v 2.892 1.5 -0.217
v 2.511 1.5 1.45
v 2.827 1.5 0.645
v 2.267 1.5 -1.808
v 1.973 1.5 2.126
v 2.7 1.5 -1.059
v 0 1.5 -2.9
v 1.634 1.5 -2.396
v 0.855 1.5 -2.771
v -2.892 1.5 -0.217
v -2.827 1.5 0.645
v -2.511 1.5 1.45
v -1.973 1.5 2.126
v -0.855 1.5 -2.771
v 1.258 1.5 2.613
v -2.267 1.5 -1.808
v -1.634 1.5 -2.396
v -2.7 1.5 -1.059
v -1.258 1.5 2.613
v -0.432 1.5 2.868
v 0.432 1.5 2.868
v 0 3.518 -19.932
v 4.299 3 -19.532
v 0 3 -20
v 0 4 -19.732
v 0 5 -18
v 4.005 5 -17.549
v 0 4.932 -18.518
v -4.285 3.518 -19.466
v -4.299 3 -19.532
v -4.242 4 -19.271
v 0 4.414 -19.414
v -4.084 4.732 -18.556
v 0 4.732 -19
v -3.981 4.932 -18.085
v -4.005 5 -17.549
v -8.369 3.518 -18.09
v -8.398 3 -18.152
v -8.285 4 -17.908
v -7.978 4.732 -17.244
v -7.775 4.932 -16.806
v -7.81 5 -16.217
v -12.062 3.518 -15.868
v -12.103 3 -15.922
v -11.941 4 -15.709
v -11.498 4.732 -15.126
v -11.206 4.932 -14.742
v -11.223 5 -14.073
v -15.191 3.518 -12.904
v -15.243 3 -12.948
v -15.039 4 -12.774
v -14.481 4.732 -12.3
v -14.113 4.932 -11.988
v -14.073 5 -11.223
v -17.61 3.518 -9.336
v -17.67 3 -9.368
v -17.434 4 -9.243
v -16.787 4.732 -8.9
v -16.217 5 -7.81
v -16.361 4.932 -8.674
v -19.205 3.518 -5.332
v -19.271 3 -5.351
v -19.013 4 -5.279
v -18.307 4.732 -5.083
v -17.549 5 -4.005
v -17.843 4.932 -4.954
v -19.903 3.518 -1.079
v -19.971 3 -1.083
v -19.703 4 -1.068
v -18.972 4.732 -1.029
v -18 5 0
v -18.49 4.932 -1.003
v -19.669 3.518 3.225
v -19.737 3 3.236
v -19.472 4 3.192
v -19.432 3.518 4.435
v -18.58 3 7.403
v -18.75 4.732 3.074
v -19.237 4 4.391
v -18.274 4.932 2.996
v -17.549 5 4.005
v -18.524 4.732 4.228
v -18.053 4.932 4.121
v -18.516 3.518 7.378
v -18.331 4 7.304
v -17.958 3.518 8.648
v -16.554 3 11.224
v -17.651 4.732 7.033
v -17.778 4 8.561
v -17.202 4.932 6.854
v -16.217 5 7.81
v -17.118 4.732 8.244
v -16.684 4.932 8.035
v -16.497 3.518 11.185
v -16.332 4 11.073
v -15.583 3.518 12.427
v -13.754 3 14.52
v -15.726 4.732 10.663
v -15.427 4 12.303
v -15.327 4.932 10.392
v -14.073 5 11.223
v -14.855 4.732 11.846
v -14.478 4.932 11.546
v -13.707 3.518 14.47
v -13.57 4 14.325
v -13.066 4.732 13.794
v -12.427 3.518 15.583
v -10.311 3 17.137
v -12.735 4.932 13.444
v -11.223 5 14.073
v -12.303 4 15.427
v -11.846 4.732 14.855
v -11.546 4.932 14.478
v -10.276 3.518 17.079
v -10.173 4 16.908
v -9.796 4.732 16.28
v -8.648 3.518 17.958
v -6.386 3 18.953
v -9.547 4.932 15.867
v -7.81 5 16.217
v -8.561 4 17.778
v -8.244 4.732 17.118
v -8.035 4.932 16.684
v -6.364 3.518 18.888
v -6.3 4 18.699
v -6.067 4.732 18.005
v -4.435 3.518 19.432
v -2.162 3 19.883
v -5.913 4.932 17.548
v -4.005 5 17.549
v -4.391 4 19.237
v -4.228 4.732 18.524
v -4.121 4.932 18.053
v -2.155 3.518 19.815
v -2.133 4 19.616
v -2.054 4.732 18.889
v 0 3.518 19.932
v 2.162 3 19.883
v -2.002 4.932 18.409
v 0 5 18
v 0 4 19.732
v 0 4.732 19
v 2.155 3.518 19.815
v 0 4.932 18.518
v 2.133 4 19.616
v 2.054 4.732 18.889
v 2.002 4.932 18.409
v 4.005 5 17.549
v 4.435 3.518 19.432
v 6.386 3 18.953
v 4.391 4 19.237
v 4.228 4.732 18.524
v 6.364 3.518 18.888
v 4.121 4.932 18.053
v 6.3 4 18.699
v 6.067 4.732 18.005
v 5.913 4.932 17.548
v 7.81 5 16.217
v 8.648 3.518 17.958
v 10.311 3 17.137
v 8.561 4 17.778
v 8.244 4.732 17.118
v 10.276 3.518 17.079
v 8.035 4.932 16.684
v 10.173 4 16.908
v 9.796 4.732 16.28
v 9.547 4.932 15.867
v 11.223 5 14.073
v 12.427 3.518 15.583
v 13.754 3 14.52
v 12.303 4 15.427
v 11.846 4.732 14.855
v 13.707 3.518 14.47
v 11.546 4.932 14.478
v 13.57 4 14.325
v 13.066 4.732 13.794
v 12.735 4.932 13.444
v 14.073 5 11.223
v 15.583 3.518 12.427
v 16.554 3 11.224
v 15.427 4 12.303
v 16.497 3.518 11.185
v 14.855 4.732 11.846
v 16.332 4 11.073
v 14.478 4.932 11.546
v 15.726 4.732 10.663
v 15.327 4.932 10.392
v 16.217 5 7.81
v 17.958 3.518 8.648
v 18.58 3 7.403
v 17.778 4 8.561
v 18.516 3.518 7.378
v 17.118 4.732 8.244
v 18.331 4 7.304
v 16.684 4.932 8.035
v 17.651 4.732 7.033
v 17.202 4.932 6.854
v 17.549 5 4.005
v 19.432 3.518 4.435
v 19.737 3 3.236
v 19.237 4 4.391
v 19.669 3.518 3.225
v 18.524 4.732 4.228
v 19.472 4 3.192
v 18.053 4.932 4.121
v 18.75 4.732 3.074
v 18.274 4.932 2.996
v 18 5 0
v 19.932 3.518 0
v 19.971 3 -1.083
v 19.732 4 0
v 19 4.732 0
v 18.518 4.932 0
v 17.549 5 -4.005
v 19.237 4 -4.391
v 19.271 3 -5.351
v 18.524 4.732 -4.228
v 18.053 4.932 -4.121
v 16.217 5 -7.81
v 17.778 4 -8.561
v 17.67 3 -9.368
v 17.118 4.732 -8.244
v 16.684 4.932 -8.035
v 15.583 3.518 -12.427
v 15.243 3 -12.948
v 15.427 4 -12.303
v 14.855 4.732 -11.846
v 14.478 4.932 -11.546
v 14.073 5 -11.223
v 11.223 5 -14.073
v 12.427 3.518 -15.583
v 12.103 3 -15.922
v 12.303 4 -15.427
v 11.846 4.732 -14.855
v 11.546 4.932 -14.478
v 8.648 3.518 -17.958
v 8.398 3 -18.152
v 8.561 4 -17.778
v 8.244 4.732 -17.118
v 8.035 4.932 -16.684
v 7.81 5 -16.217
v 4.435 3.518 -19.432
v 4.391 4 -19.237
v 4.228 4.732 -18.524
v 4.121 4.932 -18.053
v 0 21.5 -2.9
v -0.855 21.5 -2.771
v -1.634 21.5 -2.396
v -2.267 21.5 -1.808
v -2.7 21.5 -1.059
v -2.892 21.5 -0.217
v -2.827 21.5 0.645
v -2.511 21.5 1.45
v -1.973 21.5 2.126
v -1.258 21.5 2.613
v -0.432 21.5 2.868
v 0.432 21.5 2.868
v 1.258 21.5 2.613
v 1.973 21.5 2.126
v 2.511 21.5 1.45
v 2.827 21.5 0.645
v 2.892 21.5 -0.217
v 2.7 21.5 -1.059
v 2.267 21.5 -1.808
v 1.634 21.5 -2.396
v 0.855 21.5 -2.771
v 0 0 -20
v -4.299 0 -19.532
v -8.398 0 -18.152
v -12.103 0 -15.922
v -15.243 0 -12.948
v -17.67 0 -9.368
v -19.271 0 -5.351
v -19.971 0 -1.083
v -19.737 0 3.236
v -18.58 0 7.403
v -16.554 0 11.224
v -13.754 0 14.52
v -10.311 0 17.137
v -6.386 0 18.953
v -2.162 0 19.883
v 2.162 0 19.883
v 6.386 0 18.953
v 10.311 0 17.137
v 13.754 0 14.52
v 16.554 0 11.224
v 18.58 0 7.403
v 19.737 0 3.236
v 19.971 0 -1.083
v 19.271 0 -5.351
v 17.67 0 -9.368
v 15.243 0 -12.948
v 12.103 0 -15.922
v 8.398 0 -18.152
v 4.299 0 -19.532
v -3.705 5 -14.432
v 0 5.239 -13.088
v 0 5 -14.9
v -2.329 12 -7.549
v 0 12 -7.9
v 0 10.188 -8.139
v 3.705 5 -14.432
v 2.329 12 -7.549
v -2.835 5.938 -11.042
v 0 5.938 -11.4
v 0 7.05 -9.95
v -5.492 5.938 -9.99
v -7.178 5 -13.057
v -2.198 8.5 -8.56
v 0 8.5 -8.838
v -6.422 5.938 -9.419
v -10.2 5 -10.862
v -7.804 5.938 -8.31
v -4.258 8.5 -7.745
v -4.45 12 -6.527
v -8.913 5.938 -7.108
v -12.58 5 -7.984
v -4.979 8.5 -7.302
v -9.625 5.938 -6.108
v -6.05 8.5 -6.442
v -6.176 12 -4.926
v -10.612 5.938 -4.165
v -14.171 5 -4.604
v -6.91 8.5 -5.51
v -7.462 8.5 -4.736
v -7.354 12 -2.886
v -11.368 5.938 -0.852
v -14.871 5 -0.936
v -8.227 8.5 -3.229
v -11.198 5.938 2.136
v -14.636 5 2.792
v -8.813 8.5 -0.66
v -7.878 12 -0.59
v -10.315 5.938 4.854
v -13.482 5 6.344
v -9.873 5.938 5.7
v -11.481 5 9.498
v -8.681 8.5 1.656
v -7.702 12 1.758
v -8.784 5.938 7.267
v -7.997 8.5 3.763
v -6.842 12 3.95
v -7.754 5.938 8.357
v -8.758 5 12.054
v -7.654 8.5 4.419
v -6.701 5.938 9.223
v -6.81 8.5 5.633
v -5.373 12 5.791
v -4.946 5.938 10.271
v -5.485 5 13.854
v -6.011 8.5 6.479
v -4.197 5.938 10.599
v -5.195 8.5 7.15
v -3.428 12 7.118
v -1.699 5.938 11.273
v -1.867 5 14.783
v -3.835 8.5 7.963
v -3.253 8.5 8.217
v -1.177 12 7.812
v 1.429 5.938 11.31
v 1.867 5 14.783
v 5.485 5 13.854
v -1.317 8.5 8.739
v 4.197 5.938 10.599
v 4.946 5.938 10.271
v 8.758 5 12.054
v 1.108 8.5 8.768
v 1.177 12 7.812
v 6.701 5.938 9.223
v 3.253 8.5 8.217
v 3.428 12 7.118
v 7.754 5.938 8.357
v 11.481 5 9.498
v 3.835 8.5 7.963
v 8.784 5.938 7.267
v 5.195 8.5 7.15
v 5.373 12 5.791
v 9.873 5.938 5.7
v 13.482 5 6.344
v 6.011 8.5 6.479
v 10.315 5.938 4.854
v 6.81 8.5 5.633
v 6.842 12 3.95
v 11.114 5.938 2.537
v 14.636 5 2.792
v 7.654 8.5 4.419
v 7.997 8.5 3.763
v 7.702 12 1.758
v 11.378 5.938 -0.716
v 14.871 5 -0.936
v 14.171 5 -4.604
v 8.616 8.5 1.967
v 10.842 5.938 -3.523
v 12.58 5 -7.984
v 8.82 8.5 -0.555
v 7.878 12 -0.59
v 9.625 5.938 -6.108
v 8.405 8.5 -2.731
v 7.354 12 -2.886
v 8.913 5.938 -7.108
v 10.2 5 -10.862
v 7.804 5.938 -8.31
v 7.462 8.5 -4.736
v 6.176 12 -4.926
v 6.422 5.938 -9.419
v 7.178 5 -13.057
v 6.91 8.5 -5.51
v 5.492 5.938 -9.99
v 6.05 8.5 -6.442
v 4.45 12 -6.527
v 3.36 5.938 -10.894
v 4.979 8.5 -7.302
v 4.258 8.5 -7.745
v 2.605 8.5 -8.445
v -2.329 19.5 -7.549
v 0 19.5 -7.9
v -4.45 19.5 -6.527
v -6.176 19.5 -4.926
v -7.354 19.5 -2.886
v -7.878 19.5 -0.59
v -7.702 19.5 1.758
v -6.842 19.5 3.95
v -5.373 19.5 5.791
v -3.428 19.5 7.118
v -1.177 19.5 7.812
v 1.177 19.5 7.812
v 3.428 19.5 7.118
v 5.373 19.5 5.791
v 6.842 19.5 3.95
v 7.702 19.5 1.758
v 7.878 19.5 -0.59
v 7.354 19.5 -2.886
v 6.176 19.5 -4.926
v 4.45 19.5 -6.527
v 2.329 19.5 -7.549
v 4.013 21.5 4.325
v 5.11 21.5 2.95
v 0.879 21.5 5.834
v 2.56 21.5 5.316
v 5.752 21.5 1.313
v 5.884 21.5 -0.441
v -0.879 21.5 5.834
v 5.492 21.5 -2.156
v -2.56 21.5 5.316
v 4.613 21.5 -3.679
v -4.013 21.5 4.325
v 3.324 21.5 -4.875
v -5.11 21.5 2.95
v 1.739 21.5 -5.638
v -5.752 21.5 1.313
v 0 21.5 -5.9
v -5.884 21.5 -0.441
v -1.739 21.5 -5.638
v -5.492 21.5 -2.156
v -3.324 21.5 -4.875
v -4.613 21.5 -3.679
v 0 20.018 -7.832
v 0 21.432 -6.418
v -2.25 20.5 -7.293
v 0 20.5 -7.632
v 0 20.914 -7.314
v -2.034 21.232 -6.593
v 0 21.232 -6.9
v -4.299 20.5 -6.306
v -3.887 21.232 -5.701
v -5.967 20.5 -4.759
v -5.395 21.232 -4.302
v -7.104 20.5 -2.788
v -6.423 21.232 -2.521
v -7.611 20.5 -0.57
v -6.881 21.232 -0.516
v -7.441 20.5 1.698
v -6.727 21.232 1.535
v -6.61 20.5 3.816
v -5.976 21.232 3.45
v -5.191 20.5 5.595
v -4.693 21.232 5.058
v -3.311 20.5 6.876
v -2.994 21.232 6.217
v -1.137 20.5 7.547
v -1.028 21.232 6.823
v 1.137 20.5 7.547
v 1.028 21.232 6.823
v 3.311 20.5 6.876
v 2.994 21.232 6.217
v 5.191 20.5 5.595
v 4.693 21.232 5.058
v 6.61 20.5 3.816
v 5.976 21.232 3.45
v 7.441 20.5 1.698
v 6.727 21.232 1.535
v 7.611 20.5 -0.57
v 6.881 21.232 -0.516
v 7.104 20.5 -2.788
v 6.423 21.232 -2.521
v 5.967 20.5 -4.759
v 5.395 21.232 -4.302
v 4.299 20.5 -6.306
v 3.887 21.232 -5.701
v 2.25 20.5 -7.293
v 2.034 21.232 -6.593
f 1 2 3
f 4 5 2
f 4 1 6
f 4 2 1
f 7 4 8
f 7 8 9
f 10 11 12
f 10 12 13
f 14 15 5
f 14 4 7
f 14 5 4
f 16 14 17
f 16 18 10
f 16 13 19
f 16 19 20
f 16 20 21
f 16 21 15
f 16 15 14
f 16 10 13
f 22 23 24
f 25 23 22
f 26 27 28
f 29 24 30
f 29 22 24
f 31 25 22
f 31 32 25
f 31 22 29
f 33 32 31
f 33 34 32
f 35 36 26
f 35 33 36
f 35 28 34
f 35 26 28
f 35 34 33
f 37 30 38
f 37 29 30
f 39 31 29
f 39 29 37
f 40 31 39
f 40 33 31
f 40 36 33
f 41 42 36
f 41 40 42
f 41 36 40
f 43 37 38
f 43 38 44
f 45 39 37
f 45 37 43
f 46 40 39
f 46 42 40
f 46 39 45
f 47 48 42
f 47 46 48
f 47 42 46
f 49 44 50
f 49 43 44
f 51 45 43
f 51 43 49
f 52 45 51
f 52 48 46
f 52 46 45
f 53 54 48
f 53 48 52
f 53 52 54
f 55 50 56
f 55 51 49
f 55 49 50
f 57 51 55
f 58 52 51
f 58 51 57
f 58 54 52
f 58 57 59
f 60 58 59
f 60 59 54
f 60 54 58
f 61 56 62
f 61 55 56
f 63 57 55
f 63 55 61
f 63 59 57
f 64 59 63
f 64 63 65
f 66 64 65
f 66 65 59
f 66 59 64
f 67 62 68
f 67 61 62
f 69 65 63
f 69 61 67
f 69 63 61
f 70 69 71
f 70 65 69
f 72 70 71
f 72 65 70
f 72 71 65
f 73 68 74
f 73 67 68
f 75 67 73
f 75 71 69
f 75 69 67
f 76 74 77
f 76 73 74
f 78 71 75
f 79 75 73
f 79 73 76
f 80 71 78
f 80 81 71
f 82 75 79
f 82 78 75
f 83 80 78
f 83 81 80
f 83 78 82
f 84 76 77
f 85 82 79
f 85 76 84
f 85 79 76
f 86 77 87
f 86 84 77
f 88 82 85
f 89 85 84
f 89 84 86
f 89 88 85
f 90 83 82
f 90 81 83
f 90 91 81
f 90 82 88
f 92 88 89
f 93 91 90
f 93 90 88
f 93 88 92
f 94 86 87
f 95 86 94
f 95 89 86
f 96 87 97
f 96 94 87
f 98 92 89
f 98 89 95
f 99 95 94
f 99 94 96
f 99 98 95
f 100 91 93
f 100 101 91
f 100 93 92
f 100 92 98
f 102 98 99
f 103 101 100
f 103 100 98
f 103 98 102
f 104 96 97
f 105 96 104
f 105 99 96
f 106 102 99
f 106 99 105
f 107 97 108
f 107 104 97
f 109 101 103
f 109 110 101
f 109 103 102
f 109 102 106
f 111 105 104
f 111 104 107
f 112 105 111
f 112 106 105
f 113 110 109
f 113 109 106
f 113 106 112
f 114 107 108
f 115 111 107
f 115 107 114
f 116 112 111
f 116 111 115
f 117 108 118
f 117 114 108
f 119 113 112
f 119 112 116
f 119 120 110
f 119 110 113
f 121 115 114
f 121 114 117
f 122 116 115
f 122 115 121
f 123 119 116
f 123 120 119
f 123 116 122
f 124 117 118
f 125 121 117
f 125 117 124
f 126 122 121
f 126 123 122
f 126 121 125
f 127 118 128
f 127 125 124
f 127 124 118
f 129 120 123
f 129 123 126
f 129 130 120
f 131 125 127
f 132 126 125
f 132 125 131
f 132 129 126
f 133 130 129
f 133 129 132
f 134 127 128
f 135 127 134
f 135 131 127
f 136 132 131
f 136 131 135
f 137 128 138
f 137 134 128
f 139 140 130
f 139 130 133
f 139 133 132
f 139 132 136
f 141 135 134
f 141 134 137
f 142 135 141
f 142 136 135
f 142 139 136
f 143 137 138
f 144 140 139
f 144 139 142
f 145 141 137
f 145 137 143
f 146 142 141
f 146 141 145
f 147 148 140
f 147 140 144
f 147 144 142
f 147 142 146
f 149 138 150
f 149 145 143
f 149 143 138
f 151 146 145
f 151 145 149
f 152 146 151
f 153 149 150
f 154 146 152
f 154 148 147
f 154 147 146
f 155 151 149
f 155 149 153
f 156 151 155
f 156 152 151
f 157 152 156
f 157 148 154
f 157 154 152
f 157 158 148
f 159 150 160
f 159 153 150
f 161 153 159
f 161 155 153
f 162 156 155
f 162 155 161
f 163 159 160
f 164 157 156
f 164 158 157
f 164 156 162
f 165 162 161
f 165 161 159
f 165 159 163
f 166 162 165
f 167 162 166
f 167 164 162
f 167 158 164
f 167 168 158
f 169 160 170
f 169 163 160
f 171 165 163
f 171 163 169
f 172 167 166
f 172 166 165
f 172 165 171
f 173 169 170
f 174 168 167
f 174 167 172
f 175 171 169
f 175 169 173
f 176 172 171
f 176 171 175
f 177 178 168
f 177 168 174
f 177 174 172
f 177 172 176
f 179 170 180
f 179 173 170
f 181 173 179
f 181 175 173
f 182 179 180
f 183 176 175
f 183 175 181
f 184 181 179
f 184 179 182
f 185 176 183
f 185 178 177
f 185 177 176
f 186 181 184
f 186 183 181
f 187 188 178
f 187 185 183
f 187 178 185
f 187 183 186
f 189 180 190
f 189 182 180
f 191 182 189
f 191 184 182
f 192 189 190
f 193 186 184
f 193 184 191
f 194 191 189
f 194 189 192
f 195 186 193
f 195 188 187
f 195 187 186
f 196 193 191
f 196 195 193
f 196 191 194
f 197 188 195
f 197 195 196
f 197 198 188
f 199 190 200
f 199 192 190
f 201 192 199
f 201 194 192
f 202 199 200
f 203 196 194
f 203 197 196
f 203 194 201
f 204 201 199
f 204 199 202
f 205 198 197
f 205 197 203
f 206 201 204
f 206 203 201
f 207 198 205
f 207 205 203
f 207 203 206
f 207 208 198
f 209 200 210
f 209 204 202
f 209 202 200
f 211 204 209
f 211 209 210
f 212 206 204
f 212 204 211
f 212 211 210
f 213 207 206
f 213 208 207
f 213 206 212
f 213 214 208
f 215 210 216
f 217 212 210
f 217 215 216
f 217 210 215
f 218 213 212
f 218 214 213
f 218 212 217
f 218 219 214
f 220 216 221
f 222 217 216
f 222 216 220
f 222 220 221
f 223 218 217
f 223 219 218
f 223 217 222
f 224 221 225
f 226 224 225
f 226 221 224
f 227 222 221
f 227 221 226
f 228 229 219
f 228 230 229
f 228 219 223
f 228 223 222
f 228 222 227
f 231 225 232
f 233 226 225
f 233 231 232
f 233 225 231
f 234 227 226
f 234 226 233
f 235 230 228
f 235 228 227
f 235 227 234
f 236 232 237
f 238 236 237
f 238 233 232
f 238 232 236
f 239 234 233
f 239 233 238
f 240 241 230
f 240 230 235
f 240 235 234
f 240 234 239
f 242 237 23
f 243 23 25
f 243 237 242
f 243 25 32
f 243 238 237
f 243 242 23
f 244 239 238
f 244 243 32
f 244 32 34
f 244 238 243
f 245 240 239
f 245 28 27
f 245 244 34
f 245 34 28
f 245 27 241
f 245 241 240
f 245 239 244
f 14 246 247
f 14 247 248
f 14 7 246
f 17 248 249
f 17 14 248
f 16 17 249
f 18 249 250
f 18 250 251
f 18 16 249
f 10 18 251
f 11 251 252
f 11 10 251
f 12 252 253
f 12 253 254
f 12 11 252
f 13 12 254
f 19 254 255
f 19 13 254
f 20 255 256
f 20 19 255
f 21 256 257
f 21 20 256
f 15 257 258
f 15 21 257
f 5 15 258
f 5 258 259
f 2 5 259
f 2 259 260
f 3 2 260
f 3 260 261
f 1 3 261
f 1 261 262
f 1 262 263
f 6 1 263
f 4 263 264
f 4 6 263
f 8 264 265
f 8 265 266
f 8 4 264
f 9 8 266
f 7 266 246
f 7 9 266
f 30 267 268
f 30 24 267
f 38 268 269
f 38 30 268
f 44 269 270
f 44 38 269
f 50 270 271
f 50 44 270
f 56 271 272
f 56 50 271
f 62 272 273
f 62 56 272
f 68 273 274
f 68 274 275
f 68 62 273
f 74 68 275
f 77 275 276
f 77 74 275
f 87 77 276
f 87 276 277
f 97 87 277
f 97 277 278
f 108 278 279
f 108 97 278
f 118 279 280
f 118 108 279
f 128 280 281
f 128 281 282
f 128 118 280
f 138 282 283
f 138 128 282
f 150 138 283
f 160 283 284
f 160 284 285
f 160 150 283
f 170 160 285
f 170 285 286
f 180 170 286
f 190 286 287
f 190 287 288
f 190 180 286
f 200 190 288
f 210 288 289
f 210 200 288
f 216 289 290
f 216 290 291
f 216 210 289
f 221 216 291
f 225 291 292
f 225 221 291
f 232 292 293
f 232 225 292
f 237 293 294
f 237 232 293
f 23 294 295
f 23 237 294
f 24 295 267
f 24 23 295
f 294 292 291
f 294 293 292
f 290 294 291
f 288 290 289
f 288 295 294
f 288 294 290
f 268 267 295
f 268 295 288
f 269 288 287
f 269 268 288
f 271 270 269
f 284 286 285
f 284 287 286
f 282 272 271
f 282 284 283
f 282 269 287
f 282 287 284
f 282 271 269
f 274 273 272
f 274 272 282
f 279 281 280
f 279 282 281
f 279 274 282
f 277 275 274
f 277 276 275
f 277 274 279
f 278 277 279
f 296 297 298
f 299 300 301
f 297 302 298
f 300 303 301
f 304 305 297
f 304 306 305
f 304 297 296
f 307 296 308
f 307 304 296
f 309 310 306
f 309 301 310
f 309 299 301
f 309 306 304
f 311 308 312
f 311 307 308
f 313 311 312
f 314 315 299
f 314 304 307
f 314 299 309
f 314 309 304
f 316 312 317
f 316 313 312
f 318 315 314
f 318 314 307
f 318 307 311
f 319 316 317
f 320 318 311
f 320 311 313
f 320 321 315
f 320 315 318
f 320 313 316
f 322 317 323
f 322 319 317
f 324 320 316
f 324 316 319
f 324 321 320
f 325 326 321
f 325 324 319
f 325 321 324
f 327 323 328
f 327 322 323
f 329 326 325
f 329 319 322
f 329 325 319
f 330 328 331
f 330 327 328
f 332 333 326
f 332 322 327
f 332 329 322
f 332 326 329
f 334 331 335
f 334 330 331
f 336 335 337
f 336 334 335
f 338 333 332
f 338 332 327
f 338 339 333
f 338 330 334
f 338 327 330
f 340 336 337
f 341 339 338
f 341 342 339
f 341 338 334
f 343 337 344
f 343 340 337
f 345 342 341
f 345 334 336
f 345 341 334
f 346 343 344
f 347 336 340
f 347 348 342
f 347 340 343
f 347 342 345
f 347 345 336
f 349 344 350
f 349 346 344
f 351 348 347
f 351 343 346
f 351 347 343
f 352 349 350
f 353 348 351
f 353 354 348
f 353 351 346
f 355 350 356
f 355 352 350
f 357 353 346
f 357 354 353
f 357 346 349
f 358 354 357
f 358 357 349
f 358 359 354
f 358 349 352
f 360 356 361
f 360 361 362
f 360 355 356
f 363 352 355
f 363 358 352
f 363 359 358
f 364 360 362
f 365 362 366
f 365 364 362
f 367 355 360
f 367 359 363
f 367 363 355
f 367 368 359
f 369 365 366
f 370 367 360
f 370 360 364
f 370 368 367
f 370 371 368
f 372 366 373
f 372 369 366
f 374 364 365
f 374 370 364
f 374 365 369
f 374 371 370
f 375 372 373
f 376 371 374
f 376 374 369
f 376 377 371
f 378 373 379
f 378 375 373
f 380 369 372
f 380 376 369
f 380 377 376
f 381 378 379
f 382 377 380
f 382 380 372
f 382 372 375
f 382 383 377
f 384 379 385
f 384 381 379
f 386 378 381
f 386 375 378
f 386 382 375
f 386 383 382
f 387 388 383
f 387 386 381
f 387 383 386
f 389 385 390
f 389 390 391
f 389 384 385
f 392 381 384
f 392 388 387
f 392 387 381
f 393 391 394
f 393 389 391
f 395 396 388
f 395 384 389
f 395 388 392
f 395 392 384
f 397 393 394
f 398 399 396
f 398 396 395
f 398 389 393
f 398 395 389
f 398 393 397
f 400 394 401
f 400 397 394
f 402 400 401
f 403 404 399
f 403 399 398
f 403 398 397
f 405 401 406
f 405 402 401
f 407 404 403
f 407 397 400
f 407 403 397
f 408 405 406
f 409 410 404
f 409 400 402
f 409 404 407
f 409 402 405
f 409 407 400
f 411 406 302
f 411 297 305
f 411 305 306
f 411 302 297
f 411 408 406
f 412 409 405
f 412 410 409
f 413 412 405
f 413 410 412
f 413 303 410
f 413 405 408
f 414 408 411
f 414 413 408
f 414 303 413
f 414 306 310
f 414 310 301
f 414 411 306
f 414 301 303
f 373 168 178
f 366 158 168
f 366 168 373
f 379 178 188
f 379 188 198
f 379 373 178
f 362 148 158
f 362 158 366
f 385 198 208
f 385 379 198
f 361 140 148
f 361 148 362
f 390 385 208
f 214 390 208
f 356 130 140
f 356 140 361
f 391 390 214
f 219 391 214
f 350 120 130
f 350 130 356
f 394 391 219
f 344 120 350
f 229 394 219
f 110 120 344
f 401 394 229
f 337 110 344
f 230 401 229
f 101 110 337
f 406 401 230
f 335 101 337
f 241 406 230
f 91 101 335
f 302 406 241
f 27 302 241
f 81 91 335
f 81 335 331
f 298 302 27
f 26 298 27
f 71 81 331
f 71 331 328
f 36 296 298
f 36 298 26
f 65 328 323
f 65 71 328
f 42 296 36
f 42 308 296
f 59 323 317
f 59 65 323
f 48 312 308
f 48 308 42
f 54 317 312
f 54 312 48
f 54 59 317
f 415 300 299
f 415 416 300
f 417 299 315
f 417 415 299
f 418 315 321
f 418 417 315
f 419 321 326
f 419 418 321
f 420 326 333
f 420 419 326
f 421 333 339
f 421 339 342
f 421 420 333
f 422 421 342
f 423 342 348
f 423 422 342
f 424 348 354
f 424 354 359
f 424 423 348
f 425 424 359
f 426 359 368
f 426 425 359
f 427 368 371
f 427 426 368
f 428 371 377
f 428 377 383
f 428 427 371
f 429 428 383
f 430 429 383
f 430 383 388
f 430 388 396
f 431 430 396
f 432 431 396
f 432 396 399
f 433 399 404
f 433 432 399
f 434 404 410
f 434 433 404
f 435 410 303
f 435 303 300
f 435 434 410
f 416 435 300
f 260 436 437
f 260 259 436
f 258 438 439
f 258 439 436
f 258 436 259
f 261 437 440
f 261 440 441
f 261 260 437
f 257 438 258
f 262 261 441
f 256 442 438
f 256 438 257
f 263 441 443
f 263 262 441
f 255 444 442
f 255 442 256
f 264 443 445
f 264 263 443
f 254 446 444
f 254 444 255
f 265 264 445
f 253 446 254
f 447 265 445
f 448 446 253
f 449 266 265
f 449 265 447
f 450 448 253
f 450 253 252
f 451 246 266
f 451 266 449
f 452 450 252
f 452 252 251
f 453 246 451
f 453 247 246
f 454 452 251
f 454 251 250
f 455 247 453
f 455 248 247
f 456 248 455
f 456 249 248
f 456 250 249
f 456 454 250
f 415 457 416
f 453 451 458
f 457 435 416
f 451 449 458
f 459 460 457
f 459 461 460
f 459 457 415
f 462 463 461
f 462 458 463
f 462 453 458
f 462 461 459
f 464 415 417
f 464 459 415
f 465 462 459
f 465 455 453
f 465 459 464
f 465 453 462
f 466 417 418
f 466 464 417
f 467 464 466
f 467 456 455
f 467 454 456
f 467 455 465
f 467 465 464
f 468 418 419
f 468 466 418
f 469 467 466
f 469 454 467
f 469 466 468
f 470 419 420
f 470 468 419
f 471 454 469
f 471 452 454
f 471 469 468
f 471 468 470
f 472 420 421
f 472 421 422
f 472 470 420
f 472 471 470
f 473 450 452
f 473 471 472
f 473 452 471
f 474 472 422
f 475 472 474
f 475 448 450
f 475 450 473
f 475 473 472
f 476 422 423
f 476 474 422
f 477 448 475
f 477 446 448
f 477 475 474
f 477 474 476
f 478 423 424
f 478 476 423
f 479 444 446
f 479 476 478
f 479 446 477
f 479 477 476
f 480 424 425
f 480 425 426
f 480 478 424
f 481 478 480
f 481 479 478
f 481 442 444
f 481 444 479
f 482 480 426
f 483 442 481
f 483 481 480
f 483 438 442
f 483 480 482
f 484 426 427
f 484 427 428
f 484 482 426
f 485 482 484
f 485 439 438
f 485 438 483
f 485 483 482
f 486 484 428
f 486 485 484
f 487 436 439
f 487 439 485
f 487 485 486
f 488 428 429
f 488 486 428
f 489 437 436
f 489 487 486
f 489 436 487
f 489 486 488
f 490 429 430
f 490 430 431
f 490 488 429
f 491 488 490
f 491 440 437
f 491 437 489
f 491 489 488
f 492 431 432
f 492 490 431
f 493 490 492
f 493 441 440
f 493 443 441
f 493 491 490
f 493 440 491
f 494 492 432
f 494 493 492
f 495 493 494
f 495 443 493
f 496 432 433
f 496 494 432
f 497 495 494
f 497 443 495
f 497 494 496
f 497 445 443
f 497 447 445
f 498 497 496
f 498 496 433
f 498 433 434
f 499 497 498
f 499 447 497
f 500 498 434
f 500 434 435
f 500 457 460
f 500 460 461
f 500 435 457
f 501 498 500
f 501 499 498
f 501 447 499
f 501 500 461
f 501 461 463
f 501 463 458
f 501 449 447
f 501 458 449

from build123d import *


with BuildPart() as part:
    # Sketch2 → Revolve1 (revolve)
    with BuildSketch(Plane(origin=(0, 0, 0), x_dir=(0, 0, -1), z_dir=(1, 0, 0)), mode=Mode.PRIVATE) as revolve1_sk:
        with BuildLine():
            Line((0, 0), (-20, 0))
            Line((-20, 0), (-20, 3))
            ThreePointArc((-20, 3), (-19.414213562, 4.414213562), (-18, 5))
            Line((-18, 5), (-14.9, 5))
            ThreePointArc((-14.9, 5), (-9.950252532, 7.050252532), (-7.9, 12))
            Line((-7.9, 12), (-7.9, 19.5))
            ThreePointArc((-7.9, 19.5), (-7.314213562, 20.914213562), (-5.9, 21.5))
            Line((-5.9, 21.5), (-2.9, 21.5))
            Line((-2.9, 21.5), (-2.9, 1.5))
            Line((-2.9, 1.5), (0, 1.5))
            Line((0, 1.5), (0, 0))
        make_face()
    revolve(revolve1_sk.sketch.rotate(Axis((0, 0, 0), (0, 1, 0)), 180), axis=Axis((0, 0, 0), (0, 1, 0)))


solid = part.part
